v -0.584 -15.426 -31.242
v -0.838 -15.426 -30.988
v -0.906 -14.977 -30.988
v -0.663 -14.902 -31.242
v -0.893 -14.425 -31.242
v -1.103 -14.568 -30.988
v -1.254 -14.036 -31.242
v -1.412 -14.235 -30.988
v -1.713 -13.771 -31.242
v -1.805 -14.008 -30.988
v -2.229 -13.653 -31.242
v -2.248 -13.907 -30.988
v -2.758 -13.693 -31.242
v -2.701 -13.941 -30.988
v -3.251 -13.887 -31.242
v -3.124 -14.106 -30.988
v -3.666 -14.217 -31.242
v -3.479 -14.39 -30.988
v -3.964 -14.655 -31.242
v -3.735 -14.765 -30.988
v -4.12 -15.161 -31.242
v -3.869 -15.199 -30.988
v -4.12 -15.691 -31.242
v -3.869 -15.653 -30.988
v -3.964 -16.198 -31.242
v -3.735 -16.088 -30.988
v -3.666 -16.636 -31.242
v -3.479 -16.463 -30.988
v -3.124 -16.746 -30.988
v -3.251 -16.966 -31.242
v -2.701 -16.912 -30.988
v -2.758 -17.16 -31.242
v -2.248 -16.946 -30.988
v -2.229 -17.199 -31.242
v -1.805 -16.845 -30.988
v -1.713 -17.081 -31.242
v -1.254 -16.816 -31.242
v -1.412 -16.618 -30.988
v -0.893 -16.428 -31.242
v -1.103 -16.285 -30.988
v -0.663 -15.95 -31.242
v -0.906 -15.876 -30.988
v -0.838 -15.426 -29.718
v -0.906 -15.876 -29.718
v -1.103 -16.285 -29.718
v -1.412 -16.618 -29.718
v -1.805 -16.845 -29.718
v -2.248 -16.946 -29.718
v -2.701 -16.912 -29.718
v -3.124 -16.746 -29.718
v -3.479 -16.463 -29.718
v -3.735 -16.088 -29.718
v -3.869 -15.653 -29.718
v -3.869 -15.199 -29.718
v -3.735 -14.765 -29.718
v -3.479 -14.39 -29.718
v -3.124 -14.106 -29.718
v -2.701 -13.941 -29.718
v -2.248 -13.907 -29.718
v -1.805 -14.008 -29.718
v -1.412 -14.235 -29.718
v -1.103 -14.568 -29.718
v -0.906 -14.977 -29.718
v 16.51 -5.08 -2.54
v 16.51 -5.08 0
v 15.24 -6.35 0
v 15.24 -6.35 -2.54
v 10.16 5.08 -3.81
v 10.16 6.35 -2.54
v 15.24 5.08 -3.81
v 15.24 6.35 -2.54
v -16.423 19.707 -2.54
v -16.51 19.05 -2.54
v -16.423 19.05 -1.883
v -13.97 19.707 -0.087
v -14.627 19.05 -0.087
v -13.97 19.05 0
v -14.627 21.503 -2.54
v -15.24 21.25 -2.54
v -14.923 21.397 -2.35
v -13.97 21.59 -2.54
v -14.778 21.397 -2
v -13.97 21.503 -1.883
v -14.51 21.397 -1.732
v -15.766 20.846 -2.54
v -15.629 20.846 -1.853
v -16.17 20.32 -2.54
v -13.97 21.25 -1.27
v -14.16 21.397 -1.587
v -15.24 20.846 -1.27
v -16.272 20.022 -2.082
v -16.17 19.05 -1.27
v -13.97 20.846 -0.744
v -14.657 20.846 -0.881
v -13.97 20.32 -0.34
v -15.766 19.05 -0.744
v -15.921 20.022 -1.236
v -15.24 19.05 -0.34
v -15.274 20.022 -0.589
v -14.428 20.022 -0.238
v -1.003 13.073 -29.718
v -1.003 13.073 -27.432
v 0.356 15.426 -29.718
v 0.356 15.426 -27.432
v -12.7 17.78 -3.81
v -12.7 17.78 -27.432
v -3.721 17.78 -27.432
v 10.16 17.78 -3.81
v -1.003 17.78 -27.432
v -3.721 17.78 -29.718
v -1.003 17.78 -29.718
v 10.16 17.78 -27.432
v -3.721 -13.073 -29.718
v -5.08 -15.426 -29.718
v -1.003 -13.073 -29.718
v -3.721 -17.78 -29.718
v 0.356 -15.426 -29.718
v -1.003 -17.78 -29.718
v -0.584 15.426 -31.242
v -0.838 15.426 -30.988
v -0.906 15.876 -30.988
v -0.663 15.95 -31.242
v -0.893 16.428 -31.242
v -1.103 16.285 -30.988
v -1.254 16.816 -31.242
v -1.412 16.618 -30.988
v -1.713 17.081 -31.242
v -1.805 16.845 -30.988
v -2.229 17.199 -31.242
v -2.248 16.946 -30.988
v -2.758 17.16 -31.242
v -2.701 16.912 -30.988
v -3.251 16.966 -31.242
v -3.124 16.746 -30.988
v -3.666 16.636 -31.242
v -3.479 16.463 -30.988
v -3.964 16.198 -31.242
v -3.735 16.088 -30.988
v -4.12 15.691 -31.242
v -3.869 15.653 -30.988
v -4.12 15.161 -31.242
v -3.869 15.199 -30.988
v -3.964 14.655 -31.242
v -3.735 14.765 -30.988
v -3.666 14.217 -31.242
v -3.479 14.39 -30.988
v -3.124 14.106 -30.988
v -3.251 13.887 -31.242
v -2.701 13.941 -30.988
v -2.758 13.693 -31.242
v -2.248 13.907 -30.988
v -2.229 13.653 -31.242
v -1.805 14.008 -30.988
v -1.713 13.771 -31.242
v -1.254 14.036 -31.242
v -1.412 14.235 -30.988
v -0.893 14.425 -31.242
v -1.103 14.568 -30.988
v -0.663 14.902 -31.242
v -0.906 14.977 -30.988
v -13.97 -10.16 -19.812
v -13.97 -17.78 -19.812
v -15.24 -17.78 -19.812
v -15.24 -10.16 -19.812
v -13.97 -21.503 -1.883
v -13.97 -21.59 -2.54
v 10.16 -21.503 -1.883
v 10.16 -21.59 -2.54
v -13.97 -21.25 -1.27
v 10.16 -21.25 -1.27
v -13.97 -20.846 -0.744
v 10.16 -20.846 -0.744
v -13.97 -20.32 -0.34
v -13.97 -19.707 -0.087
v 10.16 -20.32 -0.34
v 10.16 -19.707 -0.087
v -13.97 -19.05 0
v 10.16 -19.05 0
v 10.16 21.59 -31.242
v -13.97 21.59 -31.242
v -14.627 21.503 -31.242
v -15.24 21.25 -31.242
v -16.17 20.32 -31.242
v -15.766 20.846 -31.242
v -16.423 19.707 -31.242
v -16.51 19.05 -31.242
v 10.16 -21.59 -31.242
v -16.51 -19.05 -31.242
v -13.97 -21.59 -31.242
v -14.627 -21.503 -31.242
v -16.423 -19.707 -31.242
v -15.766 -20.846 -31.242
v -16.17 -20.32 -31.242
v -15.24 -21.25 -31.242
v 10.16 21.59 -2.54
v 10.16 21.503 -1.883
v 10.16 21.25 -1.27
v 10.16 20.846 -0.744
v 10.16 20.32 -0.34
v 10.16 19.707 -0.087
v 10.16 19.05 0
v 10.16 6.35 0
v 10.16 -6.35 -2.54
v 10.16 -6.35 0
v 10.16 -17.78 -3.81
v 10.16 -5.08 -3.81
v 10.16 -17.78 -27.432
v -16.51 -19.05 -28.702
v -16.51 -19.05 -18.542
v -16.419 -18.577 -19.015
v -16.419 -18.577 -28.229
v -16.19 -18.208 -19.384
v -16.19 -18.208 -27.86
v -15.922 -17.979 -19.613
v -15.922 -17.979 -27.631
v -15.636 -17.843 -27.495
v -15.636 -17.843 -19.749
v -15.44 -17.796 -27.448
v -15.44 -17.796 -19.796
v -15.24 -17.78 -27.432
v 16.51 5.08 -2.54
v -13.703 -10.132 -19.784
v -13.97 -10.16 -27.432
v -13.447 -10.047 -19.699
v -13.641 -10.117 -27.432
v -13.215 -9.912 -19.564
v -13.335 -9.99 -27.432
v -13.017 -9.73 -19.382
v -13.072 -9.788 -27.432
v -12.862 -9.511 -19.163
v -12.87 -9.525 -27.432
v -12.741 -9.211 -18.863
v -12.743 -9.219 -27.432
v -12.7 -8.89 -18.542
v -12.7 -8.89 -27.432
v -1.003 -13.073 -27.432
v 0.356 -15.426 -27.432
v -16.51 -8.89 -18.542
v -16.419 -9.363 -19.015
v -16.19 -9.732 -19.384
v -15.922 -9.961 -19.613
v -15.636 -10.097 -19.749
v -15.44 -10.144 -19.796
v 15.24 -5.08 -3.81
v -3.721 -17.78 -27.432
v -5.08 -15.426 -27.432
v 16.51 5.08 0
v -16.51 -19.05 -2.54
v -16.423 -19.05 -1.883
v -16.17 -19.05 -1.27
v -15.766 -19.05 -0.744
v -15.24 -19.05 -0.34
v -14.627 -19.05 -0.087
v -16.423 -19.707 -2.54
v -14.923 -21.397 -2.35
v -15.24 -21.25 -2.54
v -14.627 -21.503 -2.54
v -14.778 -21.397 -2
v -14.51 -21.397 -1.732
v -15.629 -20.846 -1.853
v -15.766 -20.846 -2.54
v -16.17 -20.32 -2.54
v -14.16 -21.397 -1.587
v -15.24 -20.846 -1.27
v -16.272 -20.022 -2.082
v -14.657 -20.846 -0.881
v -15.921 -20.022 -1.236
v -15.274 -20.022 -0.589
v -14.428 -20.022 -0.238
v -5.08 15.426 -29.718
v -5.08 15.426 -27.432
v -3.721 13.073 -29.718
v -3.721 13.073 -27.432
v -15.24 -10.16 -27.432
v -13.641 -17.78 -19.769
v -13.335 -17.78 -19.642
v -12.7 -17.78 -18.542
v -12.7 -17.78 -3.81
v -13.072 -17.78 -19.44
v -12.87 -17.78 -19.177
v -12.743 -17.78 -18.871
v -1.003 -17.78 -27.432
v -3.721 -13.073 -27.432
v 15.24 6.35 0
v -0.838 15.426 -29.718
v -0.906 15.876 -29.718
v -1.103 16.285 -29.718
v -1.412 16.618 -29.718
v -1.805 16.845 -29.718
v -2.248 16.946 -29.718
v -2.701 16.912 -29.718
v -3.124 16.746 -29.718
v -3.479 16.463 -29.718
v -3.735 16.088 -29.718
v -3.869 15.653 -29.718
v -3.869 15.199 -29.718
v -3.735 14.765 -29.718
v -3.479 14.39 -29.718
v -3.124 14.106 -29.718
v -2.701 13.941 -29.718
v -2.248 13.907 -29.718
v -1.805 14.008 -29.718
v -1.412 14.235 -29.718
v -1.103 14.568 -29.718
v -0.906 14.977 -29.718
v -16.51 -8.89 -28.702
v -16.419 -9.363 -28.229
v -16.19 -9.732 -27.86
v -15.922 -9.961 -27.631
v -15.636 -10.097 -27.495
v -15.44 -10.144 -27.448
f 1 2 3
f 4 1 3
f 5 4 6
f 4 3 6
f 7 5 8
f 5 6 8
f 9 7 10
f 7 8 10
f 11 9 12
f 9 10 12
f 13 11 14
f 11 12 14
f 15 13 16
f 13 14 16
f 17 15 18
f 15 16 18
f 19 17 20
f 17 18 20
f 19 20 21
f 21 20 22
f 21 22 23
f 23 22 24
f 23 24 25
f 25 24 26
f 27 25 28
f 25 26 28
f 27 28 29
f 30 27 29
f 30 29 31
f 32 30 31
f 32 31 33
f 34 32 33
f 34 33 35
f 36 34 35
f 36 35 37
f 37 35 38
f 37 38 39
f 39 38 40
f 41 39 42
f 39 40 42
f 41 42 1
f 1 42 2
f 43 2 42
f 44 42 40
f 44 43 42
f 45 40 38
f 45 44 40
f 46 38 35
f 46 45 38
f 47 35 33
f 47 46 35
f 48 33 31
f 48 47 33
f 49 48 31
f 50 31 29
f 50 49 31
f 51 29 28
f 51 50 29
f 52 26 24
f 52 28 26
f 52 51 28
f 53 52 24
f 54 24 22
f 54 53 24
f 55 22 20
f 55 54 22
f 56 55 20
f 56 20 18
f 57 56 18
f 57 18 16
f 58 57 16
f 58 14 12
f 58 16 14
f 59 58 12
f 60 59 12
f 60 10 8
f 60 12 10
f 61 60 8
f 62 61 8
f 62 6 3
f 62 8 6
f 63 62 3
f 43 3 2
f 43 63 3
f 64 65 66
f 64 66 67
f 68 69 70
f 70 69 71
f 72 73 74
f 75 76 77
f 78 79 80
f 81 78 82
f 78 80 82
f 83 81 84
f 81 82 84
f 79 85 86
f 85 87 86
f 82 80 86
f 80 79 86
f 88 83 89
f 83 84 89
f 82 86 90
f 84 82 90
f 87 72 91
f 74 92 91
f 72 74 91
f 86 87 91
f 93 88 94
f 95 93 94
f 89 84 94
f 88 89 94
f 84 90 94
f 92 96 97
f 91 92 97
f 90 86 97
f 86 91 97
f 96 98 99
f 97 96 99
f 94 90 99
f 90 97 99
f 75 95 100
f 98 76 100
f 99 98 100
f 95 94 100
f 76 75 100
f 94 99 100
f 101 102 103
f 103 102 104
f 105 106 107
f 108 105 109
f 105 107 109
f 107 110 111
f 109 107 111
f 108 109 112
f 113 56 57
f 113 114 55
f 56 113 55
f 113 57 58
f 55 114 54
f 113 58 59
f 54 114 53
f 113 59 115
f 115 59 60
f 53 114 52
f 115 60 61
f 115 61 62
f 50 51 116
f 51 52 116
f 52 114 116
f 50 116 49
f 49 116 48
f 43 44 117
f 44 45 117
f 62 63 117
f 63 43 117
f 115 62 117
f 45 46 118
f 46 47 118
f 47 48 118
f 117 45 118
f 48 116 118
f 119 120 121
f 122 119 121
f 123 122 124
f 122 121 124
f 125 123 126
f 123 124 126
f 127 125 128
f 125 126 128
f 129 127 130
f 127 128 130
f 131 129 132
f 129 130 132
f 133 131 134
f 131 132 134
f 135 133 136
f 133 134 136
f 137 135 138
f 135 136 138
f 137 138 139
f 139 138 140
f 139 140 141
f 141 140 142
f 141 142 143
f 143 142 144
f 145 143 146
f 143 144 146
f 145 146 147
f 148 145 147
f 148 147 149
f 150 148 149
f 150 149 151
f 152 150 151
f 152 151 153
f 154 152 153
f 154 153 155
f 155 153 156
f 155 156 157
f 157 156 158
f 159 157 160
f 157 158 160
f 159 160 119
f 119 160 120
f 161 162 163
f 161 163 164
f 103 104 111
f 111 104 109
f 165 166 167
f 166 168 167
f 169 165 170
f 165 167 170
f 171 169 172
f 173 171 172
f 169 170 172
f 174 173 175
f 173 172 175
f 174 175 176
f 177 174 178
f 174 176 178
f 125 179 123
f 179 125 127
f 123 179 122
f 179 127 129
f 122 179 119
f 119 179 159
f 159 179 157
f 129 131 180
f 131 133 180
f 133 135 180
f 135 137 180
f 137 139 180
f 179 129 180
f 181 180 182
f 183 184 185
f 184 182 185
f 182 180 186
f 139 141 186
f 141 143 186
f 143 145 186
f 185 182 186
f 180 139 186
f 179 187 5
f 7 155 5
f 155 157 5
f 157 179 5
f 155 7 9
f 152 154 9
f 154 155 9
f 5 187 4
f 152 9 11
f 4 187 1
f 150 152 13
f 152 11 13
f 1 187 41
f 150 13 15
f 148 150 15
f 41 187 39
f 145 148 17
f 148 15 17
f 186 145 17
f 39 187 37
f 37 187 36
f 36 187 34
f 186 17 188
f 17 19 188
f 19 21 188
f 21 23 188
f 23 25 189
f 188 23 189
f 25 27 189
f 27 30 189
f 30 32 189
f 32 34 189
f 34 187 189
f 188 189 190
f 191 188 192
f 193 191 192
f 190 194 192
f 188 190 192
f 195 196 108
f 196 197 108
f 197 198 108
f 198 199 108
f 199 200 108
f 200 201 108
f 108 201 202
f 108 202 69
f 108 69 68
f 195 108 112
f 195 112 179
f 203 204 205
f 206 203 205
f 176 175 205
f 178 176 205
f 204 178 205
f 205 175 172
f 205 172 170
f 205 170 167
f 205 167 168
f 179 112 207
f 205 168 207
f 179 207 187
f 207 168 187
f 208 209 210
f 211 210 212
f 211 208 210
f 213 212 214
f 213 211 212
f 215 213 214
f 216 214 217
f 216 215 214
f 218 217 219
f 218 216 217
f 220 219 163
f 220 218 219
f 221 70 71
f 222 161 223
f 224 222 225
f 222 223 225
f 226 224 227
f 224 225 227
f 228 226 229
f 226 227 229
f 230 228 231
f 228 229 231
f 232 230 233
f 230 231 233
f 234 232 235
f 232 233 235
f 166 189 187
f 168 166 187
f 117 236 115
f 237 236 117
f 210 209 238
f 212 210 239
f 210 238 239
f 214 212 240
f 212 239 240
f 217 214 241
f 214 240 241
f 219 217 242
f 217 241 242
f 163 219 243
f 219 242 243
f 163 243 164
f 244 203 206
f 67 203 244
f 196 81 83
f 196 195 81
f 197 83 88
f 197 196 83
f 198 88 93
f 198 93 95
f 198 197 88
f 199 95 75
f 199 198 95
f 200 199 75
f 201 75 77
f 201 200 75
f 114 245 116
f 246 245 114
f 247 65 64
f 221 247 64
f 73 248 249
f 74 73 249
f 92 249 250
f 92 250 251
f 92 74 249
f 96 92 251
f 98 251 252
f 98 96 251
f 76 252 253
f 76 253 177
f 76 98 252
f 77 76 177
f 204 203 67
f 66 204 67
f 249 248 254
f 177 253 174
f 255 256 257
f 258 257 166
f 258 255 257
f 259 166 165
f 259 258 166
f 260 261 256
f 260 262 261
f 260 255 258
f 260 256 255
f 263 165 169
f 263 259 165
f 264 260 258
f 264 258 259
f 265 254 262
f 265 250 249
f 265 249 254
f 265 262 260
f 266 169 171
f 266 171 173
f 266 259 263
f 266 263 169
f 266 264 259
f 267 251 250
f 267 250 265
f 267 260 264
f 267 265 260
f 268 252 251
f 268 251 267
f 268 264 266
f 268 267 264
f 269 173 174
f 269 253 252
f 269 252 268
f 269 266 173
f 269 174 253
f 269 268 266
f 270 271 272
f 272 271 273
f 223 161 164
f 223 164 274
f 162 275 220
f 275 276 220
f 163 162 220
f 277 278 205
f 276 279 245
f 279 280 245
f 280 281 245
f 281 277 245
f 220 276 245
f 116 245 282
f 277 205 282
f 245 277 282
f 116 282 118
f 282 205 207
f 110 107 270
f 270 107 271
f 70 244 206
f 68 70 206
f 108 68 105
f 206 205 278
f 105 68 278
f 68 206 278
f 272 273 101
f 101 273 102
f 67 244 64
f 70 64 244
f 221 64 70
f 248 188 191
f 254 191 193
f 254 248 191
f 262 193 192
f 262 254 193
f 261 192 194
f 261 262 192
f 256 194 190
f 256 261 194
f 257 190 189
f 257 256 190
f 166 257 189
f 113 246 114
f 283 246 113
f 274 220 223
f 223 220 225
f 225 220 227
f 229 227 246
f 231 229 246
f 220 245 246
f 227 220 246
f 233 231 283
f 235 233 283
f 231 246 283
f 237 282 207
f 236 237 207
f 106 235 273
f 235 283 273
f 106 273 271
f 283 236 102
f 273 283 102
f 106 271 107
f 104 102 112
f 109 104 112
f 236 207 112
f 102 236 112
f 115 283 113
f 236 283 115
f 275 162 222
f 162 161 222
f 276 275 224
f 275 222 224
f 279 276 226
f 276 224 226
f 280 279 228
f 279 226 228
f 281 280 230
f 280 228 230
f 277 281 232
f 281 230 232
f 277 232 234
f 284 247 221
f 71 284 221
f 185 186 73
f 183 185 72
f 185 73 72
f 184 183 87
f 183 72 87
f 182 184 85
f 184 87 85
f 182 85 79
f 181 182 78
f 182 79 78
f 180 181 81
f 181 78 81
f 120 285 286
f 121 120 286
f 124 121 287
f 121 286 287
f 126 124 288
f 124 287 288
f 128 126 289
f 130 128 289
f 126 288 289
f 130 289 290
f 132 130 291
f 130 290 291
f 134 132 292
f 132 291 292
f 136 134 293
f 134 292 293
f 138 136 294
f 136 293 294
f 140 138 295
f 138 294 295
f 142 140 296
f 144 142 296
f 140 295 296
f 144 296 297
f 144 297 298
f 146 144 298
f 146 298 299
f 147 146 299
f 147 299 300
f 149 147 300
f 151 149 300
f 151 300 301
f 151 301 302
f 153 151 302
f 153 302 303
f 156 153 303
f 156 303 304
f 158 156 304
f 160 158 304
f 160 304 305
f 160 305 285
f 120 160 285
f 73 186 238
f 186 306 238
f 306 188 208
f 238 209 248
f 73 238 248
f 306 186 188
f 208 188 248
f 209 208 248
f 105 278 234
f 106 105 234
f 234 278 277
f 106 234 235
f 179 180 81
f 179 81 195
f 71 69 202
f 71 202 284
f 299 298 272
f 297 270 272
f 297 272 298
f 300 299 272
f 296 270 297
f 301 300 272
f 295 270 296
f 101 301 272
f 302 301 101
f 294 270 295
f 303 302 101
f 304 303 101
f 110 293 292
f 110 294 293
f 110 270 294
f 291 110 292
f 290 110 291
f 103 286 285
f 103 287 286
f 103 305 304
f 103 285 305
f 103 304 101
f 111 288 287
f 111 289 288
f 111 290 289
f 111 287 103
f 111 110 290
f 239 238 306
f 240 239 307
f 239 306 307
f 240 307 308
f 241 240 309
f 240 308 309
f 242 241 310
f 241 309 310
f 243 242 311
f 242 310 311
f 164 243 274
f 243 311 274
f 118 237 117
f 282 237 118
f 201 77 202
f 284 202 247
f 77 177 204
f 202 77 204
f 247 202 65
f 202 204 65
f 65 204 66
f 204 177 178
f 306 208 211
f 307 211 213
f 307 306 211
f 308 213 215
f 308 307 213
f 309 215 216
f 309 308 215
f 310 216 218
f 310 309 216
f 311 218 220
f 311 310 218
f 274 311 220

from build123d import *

# Parameters (mm, degrees)
BOSS_EXTRUDE1_DEPTH      = 21.59
BOSS_EXTRUDE1_DEPTH_BACK = 21.59
BOSS_EXTRUDE2_DEPTH      = 6.35
BOSS_EXTRUDE2_DEPTH_BACK = 6.35
SKETCH1_4_W              = 6.35
SKETCH1_4_H              = 3.81
SKETCH3_W                = 26.67
SKETCH3_H                = 31.242
BOSS_EXTRUDE3_DEPTH      = 3.81
SKETCH4_R                = 1.524
CUT_EXTRUDE1_DEPTH       = 2.286
SKETCH4_4_R              = 1.524
CUT_EXTRUDE3_DEPTH       = 39.616354359
SKETCH6_W                = 7.62
SKETCH6_H                = 7.62
CUT_EXTRUDE4_DEPTH       = 48.910486994
FILLET1_R                = 2.54
FILLET2_R                = 1.27
CHAMFER1_SIZE            = 1.27
CHAMFER2_SIZE            = 0.254


with BuildPart() as part:
    # Sketch1 → Boss-Extrude1 (new, two sides: drawn at the far end of the back side and taken through both)
    with BuildSketch(Plane(origin=(0, 0, 0), x_dir=(1, 0, 0), z_dir=(0, 1, 0)).offset(-BOSS_EXTRUDE1_DEPTH_BACK)):
        Polygon((-16.51, 31.242), (-16.51, 0), (10.16, 0), (10.16, 3.81), (-12.7, 3.81), (-12.7, 27.432), (10.16, 27.432), (10.16, 31.242), align=None)
    extrude(amount=BOSS_EXTRUDE1_DEPTH + BOSS_EXTRUDE1_DEPTH_BACK)

    # Sketch1<4> → Boss-Extrude2 (add, two sides: drawn at the far end of the back side and taken through both)
    with BuildSketch(Plane(origin=(0, 0, 0), x_dir=(1, 0, 0), z_dir=(0, 1, 0)).offset(-BOSS_EXTRUDE2_DEPTH_BACK)):
        with Locations((13.335, 1.905)):
            Rectangle(SKETCH1_4_W, SKETCH1_4_H)
    extrude(amount=BOSS_EXTRUDE2_DEPTH + BOSS_EXTRUDE2_DEPTH_BACK)

    # Sketch3 → Boss-Extrude3 (add)
    with BuildSketch(Plane(origin=(0, 21.59, 0), x_dir=(1, 0, 0), z_dir=(0, 1, 0))):
        with Locations((-3.175, 15.621)):
            Rectangle(SKETCH3_W, SKETCH3_H)
    boss_extrude3 = extrude(amount=-BOSS_EXTRUDE3_DEPTH)

    # Mirror1: Boss-Extrude3 across plane
    add(boss_extrude3.mirror(Plane.ZX))

    # Sketch4 → Cut-Extrude1 (cut)
    with BuildSketch(Plane.XY.offset(-27.432)):
        Polygon((0.3556, 15.426316158), (-1.0033, 17.78), (-3.7211, 17.78), (-5.08, 15.426316158), (-3.7211, 13.072632315), (-1.0033, 13.072632315), align=None)
        with Locations((-2.3622, 15.426316158)):
            Circle(SKETCH4_R, mode=Mode.SUBTRACT)
    cut_extrude1 = extrude(amount=-CUT_EXTRUDE1_DEPTH, mode=Mode.SUBTRACT)

    # Sketch4<4> → Cut-Extrude3 (cut, through all)
    with BuildSketch(Plane.XY.offset(-27.432)):
        with Locations((-2.3622, 15.426316158)):
            Circle(SKETCH4_4_R)
    cut_extrude3 = extrude(amount=-CUT_EXTRUDE3_DEPTH, mode=Mode.SUBTRACT)

    # Mirror2: Cut-Extrude1, Cut-Extrude3 across plane
    add(cut_extrude1.mirror(Plane.ZX), mode=Mode.SUBTRACT)
    add(cut_extrude3.mirror(Plane.ZX), mode=Mode.SUBTRACT)

    # Sketch6 → Cut-Extrude4 (cut, through all)
    with BuildSketch(Plane(origin=(-12.7, 0, 0), x_dir=(0, 0, -1), z_dir=(1, 0, 0))):
        with Locations((23.622, -13.97)):
            Rectangle(SKETCH6_W, SKETCH6_H)
    extrude(amount=-CUT_EXTRUDE4_DEPTH, mode=Mode.SUBTRACT)

    # Fillet1
    fillet1_edges = [part.edges().sort_by_distance(p)[0] for p in [
        (-16.51, 0, 0),
        (-16.51, 21.59, -15.621),
        (-3.175, 21.59, 0),
        (-16.51, -21.59, -15.621),
        (-3.175, -21.59, 0),
    ]]
    fillet(fillet1_edges, radius=FILLET1_R)

    # Fillet2
    fillet2_edges = [part.edges().sort_by_distance(p)[0] for p in [
        (-16.51, -13.97, -27.432),
        (-16.51, -17.78, -23.622),
        (-16.51, -13.97, -19.812),
        (-16.51, -10.16, -23.622),
        (-12.7, -10.16, -23.622),
        (-12.7, -13.97, -19.812),
    ]]
    fillet(fillet2_edges, radius=FILLET2_R - 0.0001)  # a hair under: the kernel refuses the full size

    # Chamfer1
    chamfer1_edges = [part.edges().sort_by_distance(p)[0] for p in [
        (13.335, -6.35, -3.81),
        (16.51, 0, -3.81),
        (16.51, -6.35, -1.905),
        (13.335, 6.35, -3.81),
        (16.51, 6.35, -1.905),
    ]]
    chamfer(chamfer1_edges, length=CHAMFER1_SIZE)

    # Chamfer2
    chamfer2_edges = [part.edges().sort_by_distance(p)[0] for p in [
        (-3.8862, 15.426316158, -31.242),
        (-3.8862, -15.426316158, -31.242),
    ]]
    chamfer(chamfer2_edges, length=CHAMFER2_SIZE)


solid = part.part
